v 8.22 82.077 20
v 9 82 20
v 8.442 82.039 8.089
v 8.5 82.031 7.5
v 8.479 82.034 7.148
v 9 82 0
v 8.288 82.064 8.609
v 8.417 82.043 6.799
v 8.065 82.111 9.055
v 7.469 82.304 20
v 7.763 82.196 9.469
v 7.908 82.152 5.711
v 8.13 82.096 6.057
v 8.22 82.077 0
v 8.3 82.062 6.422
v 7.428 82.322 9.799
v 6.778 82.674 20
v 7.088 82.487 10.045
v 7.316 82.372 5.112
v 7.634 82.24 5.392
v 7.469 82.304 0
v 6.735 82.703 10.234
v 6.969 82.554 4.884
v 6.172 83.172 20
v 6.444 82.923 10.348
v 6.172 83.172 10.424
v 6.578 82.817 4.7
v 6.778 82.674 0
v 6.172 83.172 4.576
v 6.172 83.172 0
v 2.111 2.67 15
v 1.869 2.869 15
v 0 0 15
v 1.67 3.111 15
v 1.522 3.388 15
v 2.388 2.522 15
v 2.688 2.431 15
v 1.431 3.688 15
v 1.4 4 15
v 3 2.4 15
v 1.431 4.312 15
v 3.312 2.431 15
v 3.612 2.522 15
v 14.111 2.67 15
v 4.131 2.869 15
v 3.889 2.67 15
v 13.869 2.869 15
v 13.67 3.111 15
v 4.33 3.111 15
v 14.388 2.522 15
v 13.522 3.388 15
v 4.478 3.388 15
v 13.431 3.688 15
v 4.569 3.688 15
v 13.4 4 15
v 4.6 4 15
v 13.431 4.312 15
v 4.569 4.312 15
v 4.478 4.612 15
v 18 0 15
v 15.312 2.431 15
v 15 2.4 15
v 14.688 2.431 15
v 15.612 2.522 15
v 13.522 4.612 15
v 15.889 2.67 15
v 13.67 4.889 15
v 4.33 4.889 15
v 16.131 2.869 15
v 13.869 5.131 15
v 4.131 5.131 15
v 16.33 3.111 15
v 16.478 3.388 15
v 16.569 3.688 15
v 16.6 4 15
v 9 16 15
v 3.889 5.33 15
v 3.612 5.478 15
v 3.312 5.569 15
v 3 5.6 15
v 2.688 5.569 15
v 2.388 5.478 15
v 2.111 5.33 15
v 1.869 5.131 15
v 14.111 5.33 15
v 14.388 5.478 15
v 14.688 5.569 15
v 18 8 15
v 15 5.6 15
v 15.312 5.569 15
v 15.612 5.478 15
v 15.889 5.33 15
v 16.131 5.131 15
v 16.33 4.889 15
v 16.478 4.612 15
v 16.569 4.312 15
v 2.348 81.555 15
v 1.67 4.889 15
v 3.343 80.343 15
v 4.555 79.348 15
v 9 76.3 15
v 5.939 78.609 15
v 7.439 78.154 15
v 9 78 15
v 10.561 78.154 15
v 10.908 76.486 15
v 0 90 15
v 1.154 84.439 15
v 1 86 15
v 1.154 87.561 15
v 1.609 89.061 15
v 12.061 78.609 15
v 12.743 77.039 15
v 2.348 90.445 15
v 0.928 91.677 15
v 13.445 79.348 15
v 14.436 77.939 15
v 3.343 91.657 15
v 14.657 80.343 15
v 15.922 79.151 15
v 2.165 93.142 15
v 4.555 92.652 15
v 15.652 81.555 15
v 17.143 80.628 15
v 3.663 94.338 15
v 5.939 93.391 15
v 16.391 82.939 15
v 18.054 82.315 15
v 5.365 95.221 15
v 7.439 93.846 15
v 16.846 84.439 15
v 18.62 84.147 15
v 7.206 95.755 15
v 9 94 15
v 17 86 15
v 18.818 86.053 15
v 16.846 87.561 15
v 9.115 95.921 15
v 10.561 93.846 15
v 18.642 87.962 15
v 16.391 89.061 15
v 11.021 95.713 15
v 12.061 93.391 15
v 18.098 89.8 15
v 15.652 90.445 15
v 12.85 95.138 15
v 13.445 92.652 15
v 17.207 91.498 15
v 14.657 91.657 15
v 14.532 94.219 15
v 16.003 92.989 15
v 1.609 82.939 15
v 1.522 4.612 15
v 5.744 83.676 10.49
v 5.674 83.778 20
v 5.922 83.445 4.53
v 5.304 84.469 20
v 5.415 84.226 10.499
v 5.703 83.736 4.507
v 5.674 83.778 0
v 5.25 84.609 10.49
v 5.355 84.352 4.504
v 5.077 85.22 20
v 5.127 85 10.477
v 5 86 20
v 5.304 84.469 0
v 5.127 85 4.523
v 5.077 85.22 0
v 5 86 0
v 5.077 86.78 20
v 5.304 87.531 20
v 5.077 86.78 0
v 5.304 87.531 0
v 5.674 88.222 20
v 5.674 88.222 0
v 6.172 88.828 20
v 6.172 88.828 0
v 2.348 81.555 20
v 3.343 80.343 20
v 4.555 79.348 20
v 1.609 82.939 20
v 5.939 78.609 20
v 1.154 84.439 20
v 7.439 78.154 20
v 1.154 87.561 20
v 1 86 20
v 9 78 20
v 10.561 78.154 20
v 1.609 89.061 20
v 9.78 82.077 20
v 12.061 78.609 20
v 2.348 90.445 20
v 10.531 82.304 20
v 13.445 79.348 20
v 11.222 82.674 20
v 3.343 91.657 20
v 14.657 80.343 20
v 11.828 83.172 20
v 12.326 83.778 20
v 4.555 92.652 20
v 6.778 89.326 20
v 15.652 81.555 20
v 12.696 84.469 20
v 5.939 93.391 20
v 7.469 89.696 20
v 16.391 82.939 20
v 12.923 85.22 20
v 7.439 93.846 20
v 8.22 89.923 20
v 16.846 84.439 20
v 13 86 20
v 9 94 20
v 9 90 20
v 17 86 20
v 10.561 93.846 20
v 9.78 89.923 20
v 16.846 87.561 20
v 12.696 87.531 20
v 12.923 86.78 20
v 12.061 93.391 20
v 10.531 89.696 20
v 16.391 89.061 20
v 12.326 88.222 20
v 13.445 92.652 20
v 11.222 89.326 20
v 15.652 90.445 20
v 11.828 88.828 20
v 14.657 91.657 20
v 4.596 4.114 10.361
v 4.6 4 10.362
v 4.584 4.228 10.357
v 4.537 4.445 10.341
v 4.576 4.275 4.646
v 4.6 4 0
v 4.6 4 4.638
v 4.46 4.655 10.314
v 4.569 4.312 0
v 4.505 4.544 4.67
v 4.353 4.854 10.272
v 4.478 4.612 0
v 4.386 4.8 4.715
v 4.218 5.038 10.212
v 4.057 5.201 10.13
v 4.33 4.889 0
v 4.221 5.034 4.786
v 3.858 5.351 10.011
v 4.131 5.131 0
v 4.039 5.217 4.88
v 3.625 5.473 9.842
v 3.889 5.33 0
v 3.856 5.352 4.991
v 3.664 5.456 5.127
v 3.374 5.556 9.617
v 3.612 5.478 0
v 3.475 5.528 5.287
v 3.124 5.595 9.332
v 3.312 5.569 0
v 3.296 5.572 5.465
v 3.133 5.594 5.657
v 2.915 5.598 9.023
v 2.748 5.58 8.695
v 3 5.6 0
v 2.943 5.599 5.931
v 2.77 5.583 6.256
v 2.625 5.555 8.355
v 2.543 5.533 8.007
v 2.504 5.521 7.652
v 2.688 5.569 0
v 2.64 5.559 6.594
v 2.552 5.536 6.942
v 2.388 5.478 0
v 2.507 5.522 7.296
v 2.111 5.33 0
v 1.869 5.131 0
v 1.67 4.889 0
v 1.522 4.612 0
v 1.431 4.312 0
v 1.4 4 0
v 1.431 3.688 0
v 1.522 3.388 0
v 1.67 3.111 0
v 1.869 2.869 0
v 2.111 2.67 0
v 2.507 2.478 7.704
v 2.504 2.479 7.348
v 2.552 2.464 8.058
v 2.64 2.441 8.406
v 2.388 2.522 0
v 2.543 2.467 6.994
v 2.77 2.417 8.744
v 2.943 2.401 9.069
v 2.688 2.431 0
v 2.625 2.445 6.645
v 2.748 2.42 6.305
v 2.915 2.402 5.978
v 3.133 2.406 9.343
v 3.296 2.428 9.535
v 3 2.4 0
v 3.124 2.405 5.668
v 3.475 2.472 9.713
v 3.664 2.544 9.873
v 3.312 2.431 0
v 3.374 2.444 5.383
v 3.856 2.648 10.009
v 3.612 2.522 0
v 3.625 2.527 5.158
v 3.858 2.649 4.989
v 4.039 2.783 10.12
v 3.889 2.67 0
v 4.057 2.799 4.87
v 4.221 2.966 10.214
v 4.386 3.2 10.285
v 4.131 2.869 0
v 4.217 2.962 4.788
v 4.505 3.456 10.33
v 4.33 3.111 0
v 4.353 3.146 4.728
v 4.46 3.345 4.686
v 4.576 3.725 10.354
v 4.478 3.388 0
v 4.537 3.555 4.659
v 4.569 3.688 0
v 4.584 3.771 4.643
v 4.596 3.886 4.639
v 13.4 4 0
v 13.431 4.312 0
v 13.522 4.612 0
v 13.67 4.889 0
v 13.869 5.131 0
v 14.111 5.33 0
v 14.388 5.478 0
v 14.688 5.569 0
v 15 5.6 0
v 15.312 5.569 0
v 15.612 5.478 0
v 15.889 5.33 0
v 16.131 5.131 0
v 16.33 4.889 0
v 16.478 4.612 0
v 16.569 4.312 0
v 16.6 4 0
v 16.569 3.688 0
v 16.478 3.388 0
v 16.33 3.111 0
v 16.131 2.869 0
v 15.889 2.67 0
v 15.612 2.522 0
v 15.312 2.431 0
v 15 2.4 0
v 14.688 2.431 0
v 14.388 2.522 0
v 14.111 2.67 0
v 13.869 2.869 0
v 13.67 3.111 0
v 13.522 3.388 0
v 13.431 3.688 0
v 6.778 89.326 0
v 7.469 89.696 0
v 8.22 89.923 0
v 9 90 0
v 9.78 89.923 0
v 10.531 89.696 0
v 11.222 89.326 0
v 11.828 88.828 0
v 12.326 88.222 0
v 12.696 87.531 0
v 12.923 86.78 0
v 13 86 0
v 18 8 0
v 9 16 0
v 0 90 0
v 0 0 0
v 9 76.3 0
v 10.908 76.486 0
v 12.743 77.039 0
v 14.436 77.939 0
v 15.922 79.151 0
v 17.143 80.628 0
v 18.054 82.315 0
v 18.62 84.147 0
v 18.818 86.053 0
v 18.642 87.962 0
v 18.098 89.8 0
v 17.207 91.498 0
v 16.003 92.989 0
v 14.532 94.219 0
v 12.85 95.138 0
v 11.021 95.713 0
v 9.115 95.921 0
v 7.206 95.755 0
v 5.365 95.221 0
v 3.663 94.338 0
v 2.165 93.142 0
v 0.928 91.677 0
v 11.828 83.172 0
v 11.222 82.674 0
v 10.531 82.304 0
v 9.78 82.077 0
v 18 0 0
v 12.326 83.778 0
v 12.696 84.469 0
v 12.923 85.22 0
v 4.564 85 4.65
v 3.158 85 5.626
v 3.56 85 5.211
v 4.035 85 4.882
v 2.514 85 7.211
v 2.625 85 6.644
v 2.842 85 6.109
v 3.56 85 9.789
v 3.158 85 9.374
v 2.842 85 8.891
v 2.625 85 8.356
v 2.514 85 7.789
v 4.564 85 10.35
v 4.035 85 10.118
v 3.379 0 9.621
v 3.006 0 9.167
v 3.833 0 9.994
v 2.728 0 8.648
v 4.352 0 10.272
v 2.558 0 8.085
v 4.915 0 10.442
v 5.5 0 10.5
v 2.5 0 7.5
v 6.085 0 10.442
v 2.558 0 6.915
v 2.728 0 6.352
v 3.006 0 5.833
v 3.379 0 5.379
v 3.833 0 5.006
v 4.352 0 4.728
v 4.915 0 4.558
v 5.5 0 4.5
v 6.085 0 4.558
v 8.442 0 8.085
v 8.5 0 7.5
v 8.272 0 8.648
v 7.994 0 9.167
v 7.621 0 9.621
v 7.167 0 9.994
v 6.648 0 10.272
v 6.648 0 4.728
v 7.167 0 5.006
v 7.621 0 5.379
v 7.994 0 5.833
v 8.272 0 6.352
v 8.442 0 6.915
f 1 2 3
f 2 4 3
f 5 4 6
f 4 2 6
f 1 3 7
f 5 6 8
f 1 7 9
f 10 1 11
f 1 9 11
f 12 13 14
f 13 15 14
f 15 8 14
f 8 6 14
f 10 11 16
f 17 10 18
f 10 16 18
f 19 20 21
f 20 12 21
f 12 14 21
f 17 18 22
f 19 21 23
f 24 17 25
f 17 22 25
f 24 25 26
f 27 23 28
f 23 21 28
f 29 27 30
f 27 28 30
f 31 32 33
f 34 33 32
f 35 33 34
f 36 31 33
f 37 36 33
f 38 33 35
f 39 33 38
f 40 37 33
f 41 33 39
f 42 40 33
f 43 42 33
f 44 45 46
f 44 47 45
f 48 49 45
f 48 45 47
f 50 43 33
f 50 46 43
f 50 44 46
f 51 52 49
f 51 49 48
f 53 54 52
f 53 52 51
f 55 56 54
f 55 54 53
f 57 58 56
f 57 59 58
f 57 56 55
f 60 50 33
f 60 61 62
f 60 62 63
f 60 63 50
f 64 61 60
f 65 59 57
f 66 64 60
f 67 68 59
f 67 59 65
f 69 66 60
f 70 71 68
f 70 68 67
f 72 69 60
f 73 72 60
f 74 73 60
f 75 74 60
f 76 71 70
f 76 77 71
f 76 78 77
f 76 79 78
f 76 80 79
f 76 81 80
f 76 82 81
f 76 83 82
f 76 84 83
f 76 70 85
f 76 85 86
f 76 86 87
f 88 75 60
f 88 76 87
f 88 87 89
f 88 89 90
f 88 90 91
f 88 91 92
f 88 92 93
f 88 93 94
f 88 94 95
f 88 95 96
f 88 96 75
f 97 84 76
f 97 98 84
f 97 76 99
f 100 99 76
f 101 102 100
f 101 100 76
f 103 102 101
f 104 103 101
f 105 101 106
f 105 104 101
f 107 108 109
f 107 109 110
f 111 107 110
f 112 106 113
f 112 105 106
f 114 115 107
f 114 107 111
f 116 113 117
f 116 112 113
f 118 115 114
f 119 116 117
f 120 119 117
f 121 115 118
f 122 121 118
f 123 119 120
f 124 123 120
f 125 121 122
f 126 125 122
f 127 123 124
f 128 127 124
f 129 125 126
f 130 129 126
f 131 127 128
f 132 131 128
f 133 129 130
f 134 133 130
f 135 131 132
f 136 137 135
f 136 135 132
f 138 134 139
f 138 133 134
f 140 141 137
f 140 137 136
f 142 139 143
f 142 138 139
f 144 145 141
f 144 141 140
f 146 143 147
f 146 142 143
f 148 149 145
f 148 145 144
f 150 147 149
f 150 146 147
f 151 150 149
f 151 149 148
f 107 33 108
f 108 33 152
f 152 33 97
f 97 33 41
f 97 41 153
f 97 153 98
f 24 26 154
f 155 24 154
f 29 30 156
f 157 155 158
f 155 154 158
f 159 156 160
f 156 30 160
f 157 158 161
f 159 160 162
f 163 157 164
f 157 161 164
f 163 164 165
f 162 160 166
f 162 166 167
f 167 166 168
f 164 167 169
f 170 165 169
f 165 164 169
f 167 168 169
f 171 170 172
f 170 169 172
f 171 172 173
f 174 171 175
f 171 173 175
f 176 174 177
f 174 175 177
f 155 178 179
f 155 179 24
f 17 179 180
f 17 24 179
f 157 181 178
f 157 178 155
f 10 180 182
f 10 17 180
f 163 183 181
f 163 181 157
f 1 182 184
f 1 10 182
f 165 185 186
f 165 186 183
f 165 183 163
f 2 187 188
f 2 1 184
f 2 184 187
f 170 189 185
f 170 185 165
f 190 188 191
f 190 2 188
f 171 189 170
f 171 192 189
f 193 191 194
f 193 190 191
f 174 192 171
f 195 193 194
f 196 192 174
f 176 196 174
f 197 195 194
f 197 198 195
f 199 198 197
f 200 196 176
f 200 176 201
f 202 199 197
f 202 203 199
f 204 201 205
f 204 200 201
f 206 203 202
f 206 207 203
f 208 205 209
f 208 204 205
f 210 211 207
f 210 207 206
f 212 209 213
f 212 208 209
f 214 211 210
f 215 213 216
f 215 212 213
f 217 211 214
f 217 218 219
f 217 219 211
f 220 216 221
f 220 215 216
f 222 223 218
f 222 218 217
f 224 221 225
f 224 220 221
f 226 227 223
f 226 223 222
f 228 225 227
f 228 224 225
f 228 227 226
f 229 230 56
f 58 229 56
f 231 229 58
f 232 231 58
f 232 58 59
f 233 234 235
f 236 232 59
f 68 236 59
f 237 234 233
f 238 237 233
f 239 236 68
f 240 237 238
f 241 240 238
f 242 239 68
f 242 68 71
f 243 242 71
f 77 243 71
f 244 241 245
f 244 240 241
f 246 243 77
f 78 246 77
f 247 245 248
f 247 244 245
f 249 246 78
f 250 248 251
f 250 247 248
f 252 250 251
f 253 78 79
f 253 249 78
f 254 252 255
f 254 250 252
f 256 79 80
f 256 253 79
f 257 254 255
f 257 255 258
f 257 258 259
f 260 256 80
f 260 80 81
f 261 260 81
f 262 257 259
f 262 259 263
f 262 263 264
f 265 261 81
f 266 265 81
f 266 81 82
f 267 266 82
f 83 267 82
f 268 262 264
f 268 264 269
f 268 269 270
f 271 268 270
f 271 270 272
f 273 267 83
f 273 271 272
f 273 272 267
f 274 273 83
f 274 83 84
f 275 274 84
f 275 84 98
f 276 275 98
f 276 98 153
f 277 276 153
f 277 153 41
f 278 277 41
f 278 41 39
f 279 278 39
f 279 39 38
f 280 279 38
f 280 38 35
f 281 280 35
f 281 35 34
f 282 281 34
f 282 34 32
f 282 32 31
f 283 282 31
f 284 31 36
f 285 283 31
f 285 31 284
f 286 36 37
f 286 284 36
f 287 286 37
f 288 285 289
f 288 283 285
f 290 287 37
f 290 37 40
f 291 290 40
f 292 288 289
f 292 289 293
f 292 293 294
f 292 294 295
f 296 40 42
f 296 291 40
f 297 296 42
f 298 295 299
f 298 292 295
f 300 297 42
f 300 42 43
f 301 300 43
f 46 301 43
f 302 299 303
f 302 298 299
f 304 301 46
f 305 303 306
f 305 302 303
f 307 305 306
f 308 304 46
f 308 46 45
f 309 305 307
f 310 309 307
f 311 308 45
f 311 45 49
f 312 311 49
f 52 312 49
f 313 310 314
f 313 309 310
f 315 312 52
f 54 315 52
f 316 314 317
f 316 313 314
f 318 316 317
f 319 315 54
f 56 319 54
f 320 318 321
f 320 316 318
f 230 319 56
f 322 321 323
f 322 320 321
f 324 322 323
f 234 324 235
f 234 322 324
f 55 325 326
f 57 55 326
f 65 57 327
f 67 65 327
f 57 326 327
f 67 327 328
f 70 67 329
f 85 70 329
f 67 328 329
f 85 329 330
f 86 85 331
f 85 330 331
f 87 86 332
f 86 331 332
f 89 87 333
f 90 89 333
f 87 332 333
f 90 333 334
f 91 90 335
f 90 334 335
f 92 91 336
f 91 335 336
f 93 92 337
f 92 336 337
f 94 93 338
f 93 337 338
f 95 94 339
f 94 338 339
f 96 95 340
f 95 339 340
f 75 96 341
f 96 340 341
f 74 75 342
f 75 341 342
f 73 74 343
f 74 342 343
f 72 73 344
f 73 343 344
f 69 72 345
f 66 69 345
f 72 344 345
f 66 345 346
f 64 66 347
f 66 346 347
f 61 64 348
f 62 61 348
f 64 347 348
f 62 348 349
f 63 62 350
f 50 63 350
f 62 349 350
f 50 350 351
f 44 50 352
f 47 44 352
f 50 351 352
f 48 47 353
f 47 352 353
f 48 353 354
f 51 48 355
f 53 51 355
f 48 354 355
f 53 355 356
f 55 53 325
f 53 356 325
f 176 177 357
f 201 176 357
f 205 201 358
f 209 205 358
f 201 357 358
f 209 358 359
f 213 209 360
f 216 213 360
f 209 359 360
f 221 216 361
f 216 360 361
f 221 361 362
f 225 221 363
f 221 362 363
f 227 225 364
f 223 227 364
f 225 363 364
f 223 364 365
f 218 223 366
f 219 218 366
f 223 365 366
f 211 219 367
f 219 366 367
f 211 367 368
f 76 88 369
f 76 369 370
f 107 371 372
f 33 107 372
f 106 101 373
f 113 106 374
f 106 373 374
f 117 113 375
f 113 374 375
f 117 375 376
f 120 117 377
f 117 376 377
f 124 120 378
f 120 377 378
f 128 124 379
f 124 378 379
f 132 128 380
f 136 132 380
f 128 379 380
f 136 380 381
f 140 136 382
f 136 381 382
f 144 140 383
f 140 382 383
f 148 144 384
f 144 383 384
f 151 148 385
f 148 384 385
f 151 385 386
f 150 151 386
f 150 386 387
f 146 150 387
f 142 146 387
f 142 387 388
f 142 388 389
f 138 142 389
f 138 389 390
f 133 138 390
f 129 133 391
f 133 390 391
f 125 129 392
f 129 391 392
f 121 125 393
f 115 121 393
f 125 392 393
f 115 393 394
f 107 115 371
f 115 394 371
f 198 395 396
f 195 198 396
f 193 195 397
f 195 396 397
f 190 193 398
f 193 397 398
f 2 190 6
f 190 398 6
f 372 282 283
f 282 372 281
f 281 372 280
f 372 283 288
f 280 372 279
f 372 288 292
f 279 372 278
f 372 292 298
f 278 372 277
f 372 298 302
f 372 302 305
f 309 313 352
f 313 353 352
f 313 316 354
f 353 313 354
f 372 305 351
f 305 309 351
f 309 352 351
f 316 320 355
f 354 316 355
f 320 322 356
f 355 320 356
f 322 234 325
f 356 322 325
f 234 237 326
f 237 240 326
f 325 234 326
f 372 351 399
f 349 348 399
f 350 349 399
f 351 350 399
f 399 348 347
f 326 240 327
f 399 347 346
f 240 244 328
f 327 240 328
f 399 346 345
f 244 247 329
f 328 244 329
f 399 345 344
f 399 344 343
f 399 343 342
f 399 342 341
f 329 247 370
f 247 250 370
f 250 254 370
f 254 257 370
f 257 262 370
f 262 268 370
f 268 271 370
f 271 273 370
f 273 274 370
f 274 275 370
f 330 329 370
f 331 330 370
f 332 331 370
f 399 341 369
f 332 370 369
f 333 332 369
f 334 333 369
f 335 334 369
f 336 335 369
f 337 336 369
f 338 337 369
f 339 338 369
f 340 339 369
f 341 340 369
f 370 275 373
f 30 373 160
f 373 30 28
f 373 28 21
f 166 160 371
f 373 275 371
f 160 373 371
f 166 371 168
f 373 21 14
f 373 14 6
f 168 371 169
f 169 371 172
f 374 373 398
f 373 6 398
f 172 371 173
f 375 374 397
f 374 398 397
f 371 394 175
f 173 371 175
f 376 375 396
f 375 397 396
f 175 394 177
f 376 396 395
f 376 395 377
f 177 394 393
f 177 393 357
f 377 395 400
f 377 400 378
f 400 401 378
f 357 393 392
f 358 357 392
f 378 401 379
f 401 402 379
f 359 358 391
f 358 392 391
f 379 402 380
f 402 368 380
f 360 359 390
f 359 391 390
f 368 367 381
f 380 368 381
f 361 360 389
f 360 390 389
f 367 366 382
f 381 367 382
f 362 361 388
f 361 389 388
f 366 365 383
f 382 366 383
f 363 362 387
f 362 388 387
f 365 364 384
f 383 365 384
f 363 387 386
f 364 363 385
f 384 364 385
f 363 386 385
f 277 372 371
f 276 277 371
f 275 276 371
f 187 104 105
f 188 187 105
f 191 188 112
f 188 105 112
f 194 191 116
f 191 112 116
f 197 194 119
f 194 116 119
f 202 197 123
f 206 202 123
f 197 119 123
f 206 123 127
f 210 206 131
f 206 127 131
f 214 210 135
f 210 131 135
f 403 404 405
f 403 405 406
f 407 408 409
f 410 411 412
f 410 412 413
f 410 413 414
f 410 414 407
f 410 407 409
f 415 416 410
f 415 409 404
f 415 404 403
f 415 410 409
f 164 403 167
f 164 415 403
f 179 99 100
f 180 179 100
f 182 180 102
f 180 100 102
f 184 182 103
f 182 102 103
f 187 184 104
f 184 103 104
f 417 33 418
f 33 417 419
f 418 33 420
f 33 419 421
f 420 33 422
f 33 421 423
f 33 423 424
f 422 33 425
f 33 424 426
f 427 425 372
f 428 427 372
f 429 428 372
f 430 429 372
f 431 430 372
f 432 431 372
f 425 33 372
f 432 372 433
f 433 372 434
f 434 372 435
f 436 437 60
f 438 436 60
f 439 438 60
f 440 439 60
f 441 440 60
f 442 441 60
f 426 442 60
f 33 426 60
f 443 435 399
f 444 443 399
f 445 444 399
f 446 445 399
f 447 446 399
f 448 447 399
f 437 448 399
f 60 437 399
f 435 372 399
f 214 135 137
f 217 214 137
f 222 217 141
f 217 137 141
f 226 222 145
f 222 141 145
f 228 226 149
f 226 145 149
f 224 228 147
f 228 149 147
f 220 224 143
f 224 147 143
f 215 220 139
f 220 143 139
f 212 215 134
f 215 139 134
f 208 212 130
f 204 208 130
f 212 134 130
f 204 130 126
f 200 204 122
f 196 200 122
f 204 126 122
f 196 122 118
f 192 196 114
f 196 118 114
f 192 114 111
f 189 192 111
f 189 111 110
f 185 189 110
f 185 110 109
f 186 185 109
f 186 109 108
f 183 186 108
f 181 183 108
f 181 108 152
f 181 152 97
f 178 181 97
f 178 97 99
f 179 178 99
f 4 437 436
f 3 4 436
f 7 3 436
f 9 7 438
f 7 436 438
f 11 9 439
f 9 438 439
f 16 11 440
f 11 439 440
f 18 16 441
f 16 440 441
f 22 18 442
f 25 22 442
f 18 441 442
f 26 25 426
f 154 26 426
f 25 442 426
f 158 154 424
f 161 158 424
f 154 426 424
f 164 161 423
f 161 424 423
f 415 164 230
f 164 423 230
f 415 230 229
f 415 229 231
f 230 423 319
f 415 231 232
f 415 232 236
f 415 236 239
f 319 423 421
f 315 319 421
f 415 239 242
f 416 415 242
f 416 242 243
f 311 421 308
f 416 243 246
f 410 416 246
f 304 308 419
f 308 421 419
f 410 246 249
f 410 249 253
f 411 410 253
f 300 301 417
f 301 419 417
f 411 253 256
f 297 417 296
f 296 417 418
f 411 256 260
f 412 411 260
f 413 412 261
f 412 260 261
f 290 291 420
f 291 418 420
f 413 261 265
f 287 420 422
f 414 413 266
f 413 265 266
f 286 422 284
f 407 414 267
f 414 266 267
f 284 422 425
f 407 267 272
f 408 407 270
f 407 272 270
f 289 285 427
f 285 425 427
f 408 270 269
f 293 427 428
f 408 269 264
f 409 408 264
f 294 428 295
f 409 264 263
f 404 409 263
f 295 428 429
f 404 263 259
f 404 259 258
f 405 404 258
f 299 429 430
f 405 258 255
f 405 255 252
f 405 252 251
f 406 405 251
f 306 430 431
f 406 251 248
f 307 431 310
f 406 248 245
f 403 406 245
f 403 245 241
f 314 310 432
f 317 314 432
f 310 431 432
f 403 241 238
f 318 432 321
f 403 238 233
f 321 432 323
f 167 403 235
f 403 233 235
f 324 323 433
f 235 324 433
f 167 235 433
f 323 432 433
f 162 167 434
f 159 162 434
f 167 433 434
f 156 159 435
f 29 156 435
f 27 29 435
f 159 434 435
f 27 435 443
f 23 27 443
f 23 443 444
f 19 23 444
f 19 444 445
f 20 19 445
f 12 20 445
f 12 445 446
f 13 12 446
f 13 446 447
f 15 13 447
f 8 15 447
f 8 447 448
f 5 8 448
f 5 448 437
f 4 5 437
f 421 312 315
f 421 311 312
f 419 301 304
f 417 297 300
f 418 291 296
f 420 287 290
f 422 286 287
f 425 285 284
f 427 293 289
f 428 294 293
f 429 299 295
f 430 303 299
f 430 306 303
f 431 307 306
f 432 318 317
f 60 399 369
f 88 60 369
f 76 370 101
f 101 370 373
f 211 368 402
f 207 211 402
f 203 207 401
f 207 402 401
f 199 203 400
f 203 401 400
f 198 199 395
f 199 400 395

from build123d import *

# Parameters (mm, degrees)
F1_DEPTH = 20
F0_R     = 1.6
F2_DEPTH = 15
F4_R     = 3
F5_DEPTH = 85


with BuildPart() as f1:
    # F0 (on Top) → F1 (new body)
    with BuildSketch(Plane.XY):
        with BuildLine():
            Line((9, 82), (9, 78))
            ThreePointArc((9, 78), (14.6568542495, 80.3431457505), (17, 86))
            ThreePointArc((17, 86), (5.9385325411, 93.3910362601), (3.3431457505, 80.3431457505))
            Line((3.3431457505, 80.3431457505), (6.1715728753, 83.1715728753))
            ThreePointArc((6.1715728753, 83.1715728753), (5, 86), (6.1715728753, 88.8284271247))
            ThreePointArc((6.1715728753, 88.8284271247), (10.5307337295, 89.69551813), (13, 86))
            ThreePointArc((13, 86), (12.69551813, 84.4692662705), (11.8284271247, 83.1715728753))
            ThreePointArc((11.8284271247, 83.1715728753), (10.5307337295, 82.30448187), (9, 82))
        make_face()
        with BuildLine():
            ThreePointArc((3.3431457505, 80.3431457505), (5.9385325411, 78.6089637399), (9, 78))
            Line((9, 78), (9, 82))
            ThreePointArc((9, 82), (7.4692662705, 82.30448187), (6.1715728753, 83.1715728753))
            Line((6.1715728753, 83.1715728753), (3.3431457505, 80.3431457505))
        make_face()
    extrude(amount=F1_DEPTH)

    # F0 (on Top) → F2 (join)
    with BuildSketch(Plane.XY):
        with BuildLine():
            ThreePointArc((9, 76.3), (17.2071692051, 91.4977753902), (0, 90))
            Line((0, 90), (0, 0))
            Line((0, 0), (18, 0))
            Line((18, 0), (18, 8))
            Line((18, 8), (9, 16))
            Line((9, 16), (9, 46))
            Line((9, 46), (9, 76.3))
        make_face()
        with Locations((3, 4)):
            Circle(F0_R, mode=Mode.SUBTRACT)
        with BuildLine():
            ThreePointArc((16.6, 4), (15, 2.4), (13.4, 4))
            ThreePointArc((13.4, 4), (15, 5.6), (16.6, 4))
        make_face(mode=Mode.SUBTRACT)
        with BuildLine():
            ThreePointArc((17, 86), (14.6568542495, 80.3431457505), (9, 78))
            ThreePointArc((9, 78), (5.9385325411, 78.6089637399), (3.3431457505, 80.3431457505))
            ThreePointArc((3.3431457505, 80.3431457505), (5.9385325411, 93.3910362601), (17, 86))
        make_face(mode=Mode.SUBTRACT)
    extrude(amount=F2_DEPTH)

    # F4 (on face) → F5 (cut)
    with BuildSketch(Plane.XZ):
        with Locations((5.5, 7.5)):
            Circle(F4_R)
    extrude(amount=-F5_DEPTH, mode=Mode.SUBTRACT)


solid = f1.part
